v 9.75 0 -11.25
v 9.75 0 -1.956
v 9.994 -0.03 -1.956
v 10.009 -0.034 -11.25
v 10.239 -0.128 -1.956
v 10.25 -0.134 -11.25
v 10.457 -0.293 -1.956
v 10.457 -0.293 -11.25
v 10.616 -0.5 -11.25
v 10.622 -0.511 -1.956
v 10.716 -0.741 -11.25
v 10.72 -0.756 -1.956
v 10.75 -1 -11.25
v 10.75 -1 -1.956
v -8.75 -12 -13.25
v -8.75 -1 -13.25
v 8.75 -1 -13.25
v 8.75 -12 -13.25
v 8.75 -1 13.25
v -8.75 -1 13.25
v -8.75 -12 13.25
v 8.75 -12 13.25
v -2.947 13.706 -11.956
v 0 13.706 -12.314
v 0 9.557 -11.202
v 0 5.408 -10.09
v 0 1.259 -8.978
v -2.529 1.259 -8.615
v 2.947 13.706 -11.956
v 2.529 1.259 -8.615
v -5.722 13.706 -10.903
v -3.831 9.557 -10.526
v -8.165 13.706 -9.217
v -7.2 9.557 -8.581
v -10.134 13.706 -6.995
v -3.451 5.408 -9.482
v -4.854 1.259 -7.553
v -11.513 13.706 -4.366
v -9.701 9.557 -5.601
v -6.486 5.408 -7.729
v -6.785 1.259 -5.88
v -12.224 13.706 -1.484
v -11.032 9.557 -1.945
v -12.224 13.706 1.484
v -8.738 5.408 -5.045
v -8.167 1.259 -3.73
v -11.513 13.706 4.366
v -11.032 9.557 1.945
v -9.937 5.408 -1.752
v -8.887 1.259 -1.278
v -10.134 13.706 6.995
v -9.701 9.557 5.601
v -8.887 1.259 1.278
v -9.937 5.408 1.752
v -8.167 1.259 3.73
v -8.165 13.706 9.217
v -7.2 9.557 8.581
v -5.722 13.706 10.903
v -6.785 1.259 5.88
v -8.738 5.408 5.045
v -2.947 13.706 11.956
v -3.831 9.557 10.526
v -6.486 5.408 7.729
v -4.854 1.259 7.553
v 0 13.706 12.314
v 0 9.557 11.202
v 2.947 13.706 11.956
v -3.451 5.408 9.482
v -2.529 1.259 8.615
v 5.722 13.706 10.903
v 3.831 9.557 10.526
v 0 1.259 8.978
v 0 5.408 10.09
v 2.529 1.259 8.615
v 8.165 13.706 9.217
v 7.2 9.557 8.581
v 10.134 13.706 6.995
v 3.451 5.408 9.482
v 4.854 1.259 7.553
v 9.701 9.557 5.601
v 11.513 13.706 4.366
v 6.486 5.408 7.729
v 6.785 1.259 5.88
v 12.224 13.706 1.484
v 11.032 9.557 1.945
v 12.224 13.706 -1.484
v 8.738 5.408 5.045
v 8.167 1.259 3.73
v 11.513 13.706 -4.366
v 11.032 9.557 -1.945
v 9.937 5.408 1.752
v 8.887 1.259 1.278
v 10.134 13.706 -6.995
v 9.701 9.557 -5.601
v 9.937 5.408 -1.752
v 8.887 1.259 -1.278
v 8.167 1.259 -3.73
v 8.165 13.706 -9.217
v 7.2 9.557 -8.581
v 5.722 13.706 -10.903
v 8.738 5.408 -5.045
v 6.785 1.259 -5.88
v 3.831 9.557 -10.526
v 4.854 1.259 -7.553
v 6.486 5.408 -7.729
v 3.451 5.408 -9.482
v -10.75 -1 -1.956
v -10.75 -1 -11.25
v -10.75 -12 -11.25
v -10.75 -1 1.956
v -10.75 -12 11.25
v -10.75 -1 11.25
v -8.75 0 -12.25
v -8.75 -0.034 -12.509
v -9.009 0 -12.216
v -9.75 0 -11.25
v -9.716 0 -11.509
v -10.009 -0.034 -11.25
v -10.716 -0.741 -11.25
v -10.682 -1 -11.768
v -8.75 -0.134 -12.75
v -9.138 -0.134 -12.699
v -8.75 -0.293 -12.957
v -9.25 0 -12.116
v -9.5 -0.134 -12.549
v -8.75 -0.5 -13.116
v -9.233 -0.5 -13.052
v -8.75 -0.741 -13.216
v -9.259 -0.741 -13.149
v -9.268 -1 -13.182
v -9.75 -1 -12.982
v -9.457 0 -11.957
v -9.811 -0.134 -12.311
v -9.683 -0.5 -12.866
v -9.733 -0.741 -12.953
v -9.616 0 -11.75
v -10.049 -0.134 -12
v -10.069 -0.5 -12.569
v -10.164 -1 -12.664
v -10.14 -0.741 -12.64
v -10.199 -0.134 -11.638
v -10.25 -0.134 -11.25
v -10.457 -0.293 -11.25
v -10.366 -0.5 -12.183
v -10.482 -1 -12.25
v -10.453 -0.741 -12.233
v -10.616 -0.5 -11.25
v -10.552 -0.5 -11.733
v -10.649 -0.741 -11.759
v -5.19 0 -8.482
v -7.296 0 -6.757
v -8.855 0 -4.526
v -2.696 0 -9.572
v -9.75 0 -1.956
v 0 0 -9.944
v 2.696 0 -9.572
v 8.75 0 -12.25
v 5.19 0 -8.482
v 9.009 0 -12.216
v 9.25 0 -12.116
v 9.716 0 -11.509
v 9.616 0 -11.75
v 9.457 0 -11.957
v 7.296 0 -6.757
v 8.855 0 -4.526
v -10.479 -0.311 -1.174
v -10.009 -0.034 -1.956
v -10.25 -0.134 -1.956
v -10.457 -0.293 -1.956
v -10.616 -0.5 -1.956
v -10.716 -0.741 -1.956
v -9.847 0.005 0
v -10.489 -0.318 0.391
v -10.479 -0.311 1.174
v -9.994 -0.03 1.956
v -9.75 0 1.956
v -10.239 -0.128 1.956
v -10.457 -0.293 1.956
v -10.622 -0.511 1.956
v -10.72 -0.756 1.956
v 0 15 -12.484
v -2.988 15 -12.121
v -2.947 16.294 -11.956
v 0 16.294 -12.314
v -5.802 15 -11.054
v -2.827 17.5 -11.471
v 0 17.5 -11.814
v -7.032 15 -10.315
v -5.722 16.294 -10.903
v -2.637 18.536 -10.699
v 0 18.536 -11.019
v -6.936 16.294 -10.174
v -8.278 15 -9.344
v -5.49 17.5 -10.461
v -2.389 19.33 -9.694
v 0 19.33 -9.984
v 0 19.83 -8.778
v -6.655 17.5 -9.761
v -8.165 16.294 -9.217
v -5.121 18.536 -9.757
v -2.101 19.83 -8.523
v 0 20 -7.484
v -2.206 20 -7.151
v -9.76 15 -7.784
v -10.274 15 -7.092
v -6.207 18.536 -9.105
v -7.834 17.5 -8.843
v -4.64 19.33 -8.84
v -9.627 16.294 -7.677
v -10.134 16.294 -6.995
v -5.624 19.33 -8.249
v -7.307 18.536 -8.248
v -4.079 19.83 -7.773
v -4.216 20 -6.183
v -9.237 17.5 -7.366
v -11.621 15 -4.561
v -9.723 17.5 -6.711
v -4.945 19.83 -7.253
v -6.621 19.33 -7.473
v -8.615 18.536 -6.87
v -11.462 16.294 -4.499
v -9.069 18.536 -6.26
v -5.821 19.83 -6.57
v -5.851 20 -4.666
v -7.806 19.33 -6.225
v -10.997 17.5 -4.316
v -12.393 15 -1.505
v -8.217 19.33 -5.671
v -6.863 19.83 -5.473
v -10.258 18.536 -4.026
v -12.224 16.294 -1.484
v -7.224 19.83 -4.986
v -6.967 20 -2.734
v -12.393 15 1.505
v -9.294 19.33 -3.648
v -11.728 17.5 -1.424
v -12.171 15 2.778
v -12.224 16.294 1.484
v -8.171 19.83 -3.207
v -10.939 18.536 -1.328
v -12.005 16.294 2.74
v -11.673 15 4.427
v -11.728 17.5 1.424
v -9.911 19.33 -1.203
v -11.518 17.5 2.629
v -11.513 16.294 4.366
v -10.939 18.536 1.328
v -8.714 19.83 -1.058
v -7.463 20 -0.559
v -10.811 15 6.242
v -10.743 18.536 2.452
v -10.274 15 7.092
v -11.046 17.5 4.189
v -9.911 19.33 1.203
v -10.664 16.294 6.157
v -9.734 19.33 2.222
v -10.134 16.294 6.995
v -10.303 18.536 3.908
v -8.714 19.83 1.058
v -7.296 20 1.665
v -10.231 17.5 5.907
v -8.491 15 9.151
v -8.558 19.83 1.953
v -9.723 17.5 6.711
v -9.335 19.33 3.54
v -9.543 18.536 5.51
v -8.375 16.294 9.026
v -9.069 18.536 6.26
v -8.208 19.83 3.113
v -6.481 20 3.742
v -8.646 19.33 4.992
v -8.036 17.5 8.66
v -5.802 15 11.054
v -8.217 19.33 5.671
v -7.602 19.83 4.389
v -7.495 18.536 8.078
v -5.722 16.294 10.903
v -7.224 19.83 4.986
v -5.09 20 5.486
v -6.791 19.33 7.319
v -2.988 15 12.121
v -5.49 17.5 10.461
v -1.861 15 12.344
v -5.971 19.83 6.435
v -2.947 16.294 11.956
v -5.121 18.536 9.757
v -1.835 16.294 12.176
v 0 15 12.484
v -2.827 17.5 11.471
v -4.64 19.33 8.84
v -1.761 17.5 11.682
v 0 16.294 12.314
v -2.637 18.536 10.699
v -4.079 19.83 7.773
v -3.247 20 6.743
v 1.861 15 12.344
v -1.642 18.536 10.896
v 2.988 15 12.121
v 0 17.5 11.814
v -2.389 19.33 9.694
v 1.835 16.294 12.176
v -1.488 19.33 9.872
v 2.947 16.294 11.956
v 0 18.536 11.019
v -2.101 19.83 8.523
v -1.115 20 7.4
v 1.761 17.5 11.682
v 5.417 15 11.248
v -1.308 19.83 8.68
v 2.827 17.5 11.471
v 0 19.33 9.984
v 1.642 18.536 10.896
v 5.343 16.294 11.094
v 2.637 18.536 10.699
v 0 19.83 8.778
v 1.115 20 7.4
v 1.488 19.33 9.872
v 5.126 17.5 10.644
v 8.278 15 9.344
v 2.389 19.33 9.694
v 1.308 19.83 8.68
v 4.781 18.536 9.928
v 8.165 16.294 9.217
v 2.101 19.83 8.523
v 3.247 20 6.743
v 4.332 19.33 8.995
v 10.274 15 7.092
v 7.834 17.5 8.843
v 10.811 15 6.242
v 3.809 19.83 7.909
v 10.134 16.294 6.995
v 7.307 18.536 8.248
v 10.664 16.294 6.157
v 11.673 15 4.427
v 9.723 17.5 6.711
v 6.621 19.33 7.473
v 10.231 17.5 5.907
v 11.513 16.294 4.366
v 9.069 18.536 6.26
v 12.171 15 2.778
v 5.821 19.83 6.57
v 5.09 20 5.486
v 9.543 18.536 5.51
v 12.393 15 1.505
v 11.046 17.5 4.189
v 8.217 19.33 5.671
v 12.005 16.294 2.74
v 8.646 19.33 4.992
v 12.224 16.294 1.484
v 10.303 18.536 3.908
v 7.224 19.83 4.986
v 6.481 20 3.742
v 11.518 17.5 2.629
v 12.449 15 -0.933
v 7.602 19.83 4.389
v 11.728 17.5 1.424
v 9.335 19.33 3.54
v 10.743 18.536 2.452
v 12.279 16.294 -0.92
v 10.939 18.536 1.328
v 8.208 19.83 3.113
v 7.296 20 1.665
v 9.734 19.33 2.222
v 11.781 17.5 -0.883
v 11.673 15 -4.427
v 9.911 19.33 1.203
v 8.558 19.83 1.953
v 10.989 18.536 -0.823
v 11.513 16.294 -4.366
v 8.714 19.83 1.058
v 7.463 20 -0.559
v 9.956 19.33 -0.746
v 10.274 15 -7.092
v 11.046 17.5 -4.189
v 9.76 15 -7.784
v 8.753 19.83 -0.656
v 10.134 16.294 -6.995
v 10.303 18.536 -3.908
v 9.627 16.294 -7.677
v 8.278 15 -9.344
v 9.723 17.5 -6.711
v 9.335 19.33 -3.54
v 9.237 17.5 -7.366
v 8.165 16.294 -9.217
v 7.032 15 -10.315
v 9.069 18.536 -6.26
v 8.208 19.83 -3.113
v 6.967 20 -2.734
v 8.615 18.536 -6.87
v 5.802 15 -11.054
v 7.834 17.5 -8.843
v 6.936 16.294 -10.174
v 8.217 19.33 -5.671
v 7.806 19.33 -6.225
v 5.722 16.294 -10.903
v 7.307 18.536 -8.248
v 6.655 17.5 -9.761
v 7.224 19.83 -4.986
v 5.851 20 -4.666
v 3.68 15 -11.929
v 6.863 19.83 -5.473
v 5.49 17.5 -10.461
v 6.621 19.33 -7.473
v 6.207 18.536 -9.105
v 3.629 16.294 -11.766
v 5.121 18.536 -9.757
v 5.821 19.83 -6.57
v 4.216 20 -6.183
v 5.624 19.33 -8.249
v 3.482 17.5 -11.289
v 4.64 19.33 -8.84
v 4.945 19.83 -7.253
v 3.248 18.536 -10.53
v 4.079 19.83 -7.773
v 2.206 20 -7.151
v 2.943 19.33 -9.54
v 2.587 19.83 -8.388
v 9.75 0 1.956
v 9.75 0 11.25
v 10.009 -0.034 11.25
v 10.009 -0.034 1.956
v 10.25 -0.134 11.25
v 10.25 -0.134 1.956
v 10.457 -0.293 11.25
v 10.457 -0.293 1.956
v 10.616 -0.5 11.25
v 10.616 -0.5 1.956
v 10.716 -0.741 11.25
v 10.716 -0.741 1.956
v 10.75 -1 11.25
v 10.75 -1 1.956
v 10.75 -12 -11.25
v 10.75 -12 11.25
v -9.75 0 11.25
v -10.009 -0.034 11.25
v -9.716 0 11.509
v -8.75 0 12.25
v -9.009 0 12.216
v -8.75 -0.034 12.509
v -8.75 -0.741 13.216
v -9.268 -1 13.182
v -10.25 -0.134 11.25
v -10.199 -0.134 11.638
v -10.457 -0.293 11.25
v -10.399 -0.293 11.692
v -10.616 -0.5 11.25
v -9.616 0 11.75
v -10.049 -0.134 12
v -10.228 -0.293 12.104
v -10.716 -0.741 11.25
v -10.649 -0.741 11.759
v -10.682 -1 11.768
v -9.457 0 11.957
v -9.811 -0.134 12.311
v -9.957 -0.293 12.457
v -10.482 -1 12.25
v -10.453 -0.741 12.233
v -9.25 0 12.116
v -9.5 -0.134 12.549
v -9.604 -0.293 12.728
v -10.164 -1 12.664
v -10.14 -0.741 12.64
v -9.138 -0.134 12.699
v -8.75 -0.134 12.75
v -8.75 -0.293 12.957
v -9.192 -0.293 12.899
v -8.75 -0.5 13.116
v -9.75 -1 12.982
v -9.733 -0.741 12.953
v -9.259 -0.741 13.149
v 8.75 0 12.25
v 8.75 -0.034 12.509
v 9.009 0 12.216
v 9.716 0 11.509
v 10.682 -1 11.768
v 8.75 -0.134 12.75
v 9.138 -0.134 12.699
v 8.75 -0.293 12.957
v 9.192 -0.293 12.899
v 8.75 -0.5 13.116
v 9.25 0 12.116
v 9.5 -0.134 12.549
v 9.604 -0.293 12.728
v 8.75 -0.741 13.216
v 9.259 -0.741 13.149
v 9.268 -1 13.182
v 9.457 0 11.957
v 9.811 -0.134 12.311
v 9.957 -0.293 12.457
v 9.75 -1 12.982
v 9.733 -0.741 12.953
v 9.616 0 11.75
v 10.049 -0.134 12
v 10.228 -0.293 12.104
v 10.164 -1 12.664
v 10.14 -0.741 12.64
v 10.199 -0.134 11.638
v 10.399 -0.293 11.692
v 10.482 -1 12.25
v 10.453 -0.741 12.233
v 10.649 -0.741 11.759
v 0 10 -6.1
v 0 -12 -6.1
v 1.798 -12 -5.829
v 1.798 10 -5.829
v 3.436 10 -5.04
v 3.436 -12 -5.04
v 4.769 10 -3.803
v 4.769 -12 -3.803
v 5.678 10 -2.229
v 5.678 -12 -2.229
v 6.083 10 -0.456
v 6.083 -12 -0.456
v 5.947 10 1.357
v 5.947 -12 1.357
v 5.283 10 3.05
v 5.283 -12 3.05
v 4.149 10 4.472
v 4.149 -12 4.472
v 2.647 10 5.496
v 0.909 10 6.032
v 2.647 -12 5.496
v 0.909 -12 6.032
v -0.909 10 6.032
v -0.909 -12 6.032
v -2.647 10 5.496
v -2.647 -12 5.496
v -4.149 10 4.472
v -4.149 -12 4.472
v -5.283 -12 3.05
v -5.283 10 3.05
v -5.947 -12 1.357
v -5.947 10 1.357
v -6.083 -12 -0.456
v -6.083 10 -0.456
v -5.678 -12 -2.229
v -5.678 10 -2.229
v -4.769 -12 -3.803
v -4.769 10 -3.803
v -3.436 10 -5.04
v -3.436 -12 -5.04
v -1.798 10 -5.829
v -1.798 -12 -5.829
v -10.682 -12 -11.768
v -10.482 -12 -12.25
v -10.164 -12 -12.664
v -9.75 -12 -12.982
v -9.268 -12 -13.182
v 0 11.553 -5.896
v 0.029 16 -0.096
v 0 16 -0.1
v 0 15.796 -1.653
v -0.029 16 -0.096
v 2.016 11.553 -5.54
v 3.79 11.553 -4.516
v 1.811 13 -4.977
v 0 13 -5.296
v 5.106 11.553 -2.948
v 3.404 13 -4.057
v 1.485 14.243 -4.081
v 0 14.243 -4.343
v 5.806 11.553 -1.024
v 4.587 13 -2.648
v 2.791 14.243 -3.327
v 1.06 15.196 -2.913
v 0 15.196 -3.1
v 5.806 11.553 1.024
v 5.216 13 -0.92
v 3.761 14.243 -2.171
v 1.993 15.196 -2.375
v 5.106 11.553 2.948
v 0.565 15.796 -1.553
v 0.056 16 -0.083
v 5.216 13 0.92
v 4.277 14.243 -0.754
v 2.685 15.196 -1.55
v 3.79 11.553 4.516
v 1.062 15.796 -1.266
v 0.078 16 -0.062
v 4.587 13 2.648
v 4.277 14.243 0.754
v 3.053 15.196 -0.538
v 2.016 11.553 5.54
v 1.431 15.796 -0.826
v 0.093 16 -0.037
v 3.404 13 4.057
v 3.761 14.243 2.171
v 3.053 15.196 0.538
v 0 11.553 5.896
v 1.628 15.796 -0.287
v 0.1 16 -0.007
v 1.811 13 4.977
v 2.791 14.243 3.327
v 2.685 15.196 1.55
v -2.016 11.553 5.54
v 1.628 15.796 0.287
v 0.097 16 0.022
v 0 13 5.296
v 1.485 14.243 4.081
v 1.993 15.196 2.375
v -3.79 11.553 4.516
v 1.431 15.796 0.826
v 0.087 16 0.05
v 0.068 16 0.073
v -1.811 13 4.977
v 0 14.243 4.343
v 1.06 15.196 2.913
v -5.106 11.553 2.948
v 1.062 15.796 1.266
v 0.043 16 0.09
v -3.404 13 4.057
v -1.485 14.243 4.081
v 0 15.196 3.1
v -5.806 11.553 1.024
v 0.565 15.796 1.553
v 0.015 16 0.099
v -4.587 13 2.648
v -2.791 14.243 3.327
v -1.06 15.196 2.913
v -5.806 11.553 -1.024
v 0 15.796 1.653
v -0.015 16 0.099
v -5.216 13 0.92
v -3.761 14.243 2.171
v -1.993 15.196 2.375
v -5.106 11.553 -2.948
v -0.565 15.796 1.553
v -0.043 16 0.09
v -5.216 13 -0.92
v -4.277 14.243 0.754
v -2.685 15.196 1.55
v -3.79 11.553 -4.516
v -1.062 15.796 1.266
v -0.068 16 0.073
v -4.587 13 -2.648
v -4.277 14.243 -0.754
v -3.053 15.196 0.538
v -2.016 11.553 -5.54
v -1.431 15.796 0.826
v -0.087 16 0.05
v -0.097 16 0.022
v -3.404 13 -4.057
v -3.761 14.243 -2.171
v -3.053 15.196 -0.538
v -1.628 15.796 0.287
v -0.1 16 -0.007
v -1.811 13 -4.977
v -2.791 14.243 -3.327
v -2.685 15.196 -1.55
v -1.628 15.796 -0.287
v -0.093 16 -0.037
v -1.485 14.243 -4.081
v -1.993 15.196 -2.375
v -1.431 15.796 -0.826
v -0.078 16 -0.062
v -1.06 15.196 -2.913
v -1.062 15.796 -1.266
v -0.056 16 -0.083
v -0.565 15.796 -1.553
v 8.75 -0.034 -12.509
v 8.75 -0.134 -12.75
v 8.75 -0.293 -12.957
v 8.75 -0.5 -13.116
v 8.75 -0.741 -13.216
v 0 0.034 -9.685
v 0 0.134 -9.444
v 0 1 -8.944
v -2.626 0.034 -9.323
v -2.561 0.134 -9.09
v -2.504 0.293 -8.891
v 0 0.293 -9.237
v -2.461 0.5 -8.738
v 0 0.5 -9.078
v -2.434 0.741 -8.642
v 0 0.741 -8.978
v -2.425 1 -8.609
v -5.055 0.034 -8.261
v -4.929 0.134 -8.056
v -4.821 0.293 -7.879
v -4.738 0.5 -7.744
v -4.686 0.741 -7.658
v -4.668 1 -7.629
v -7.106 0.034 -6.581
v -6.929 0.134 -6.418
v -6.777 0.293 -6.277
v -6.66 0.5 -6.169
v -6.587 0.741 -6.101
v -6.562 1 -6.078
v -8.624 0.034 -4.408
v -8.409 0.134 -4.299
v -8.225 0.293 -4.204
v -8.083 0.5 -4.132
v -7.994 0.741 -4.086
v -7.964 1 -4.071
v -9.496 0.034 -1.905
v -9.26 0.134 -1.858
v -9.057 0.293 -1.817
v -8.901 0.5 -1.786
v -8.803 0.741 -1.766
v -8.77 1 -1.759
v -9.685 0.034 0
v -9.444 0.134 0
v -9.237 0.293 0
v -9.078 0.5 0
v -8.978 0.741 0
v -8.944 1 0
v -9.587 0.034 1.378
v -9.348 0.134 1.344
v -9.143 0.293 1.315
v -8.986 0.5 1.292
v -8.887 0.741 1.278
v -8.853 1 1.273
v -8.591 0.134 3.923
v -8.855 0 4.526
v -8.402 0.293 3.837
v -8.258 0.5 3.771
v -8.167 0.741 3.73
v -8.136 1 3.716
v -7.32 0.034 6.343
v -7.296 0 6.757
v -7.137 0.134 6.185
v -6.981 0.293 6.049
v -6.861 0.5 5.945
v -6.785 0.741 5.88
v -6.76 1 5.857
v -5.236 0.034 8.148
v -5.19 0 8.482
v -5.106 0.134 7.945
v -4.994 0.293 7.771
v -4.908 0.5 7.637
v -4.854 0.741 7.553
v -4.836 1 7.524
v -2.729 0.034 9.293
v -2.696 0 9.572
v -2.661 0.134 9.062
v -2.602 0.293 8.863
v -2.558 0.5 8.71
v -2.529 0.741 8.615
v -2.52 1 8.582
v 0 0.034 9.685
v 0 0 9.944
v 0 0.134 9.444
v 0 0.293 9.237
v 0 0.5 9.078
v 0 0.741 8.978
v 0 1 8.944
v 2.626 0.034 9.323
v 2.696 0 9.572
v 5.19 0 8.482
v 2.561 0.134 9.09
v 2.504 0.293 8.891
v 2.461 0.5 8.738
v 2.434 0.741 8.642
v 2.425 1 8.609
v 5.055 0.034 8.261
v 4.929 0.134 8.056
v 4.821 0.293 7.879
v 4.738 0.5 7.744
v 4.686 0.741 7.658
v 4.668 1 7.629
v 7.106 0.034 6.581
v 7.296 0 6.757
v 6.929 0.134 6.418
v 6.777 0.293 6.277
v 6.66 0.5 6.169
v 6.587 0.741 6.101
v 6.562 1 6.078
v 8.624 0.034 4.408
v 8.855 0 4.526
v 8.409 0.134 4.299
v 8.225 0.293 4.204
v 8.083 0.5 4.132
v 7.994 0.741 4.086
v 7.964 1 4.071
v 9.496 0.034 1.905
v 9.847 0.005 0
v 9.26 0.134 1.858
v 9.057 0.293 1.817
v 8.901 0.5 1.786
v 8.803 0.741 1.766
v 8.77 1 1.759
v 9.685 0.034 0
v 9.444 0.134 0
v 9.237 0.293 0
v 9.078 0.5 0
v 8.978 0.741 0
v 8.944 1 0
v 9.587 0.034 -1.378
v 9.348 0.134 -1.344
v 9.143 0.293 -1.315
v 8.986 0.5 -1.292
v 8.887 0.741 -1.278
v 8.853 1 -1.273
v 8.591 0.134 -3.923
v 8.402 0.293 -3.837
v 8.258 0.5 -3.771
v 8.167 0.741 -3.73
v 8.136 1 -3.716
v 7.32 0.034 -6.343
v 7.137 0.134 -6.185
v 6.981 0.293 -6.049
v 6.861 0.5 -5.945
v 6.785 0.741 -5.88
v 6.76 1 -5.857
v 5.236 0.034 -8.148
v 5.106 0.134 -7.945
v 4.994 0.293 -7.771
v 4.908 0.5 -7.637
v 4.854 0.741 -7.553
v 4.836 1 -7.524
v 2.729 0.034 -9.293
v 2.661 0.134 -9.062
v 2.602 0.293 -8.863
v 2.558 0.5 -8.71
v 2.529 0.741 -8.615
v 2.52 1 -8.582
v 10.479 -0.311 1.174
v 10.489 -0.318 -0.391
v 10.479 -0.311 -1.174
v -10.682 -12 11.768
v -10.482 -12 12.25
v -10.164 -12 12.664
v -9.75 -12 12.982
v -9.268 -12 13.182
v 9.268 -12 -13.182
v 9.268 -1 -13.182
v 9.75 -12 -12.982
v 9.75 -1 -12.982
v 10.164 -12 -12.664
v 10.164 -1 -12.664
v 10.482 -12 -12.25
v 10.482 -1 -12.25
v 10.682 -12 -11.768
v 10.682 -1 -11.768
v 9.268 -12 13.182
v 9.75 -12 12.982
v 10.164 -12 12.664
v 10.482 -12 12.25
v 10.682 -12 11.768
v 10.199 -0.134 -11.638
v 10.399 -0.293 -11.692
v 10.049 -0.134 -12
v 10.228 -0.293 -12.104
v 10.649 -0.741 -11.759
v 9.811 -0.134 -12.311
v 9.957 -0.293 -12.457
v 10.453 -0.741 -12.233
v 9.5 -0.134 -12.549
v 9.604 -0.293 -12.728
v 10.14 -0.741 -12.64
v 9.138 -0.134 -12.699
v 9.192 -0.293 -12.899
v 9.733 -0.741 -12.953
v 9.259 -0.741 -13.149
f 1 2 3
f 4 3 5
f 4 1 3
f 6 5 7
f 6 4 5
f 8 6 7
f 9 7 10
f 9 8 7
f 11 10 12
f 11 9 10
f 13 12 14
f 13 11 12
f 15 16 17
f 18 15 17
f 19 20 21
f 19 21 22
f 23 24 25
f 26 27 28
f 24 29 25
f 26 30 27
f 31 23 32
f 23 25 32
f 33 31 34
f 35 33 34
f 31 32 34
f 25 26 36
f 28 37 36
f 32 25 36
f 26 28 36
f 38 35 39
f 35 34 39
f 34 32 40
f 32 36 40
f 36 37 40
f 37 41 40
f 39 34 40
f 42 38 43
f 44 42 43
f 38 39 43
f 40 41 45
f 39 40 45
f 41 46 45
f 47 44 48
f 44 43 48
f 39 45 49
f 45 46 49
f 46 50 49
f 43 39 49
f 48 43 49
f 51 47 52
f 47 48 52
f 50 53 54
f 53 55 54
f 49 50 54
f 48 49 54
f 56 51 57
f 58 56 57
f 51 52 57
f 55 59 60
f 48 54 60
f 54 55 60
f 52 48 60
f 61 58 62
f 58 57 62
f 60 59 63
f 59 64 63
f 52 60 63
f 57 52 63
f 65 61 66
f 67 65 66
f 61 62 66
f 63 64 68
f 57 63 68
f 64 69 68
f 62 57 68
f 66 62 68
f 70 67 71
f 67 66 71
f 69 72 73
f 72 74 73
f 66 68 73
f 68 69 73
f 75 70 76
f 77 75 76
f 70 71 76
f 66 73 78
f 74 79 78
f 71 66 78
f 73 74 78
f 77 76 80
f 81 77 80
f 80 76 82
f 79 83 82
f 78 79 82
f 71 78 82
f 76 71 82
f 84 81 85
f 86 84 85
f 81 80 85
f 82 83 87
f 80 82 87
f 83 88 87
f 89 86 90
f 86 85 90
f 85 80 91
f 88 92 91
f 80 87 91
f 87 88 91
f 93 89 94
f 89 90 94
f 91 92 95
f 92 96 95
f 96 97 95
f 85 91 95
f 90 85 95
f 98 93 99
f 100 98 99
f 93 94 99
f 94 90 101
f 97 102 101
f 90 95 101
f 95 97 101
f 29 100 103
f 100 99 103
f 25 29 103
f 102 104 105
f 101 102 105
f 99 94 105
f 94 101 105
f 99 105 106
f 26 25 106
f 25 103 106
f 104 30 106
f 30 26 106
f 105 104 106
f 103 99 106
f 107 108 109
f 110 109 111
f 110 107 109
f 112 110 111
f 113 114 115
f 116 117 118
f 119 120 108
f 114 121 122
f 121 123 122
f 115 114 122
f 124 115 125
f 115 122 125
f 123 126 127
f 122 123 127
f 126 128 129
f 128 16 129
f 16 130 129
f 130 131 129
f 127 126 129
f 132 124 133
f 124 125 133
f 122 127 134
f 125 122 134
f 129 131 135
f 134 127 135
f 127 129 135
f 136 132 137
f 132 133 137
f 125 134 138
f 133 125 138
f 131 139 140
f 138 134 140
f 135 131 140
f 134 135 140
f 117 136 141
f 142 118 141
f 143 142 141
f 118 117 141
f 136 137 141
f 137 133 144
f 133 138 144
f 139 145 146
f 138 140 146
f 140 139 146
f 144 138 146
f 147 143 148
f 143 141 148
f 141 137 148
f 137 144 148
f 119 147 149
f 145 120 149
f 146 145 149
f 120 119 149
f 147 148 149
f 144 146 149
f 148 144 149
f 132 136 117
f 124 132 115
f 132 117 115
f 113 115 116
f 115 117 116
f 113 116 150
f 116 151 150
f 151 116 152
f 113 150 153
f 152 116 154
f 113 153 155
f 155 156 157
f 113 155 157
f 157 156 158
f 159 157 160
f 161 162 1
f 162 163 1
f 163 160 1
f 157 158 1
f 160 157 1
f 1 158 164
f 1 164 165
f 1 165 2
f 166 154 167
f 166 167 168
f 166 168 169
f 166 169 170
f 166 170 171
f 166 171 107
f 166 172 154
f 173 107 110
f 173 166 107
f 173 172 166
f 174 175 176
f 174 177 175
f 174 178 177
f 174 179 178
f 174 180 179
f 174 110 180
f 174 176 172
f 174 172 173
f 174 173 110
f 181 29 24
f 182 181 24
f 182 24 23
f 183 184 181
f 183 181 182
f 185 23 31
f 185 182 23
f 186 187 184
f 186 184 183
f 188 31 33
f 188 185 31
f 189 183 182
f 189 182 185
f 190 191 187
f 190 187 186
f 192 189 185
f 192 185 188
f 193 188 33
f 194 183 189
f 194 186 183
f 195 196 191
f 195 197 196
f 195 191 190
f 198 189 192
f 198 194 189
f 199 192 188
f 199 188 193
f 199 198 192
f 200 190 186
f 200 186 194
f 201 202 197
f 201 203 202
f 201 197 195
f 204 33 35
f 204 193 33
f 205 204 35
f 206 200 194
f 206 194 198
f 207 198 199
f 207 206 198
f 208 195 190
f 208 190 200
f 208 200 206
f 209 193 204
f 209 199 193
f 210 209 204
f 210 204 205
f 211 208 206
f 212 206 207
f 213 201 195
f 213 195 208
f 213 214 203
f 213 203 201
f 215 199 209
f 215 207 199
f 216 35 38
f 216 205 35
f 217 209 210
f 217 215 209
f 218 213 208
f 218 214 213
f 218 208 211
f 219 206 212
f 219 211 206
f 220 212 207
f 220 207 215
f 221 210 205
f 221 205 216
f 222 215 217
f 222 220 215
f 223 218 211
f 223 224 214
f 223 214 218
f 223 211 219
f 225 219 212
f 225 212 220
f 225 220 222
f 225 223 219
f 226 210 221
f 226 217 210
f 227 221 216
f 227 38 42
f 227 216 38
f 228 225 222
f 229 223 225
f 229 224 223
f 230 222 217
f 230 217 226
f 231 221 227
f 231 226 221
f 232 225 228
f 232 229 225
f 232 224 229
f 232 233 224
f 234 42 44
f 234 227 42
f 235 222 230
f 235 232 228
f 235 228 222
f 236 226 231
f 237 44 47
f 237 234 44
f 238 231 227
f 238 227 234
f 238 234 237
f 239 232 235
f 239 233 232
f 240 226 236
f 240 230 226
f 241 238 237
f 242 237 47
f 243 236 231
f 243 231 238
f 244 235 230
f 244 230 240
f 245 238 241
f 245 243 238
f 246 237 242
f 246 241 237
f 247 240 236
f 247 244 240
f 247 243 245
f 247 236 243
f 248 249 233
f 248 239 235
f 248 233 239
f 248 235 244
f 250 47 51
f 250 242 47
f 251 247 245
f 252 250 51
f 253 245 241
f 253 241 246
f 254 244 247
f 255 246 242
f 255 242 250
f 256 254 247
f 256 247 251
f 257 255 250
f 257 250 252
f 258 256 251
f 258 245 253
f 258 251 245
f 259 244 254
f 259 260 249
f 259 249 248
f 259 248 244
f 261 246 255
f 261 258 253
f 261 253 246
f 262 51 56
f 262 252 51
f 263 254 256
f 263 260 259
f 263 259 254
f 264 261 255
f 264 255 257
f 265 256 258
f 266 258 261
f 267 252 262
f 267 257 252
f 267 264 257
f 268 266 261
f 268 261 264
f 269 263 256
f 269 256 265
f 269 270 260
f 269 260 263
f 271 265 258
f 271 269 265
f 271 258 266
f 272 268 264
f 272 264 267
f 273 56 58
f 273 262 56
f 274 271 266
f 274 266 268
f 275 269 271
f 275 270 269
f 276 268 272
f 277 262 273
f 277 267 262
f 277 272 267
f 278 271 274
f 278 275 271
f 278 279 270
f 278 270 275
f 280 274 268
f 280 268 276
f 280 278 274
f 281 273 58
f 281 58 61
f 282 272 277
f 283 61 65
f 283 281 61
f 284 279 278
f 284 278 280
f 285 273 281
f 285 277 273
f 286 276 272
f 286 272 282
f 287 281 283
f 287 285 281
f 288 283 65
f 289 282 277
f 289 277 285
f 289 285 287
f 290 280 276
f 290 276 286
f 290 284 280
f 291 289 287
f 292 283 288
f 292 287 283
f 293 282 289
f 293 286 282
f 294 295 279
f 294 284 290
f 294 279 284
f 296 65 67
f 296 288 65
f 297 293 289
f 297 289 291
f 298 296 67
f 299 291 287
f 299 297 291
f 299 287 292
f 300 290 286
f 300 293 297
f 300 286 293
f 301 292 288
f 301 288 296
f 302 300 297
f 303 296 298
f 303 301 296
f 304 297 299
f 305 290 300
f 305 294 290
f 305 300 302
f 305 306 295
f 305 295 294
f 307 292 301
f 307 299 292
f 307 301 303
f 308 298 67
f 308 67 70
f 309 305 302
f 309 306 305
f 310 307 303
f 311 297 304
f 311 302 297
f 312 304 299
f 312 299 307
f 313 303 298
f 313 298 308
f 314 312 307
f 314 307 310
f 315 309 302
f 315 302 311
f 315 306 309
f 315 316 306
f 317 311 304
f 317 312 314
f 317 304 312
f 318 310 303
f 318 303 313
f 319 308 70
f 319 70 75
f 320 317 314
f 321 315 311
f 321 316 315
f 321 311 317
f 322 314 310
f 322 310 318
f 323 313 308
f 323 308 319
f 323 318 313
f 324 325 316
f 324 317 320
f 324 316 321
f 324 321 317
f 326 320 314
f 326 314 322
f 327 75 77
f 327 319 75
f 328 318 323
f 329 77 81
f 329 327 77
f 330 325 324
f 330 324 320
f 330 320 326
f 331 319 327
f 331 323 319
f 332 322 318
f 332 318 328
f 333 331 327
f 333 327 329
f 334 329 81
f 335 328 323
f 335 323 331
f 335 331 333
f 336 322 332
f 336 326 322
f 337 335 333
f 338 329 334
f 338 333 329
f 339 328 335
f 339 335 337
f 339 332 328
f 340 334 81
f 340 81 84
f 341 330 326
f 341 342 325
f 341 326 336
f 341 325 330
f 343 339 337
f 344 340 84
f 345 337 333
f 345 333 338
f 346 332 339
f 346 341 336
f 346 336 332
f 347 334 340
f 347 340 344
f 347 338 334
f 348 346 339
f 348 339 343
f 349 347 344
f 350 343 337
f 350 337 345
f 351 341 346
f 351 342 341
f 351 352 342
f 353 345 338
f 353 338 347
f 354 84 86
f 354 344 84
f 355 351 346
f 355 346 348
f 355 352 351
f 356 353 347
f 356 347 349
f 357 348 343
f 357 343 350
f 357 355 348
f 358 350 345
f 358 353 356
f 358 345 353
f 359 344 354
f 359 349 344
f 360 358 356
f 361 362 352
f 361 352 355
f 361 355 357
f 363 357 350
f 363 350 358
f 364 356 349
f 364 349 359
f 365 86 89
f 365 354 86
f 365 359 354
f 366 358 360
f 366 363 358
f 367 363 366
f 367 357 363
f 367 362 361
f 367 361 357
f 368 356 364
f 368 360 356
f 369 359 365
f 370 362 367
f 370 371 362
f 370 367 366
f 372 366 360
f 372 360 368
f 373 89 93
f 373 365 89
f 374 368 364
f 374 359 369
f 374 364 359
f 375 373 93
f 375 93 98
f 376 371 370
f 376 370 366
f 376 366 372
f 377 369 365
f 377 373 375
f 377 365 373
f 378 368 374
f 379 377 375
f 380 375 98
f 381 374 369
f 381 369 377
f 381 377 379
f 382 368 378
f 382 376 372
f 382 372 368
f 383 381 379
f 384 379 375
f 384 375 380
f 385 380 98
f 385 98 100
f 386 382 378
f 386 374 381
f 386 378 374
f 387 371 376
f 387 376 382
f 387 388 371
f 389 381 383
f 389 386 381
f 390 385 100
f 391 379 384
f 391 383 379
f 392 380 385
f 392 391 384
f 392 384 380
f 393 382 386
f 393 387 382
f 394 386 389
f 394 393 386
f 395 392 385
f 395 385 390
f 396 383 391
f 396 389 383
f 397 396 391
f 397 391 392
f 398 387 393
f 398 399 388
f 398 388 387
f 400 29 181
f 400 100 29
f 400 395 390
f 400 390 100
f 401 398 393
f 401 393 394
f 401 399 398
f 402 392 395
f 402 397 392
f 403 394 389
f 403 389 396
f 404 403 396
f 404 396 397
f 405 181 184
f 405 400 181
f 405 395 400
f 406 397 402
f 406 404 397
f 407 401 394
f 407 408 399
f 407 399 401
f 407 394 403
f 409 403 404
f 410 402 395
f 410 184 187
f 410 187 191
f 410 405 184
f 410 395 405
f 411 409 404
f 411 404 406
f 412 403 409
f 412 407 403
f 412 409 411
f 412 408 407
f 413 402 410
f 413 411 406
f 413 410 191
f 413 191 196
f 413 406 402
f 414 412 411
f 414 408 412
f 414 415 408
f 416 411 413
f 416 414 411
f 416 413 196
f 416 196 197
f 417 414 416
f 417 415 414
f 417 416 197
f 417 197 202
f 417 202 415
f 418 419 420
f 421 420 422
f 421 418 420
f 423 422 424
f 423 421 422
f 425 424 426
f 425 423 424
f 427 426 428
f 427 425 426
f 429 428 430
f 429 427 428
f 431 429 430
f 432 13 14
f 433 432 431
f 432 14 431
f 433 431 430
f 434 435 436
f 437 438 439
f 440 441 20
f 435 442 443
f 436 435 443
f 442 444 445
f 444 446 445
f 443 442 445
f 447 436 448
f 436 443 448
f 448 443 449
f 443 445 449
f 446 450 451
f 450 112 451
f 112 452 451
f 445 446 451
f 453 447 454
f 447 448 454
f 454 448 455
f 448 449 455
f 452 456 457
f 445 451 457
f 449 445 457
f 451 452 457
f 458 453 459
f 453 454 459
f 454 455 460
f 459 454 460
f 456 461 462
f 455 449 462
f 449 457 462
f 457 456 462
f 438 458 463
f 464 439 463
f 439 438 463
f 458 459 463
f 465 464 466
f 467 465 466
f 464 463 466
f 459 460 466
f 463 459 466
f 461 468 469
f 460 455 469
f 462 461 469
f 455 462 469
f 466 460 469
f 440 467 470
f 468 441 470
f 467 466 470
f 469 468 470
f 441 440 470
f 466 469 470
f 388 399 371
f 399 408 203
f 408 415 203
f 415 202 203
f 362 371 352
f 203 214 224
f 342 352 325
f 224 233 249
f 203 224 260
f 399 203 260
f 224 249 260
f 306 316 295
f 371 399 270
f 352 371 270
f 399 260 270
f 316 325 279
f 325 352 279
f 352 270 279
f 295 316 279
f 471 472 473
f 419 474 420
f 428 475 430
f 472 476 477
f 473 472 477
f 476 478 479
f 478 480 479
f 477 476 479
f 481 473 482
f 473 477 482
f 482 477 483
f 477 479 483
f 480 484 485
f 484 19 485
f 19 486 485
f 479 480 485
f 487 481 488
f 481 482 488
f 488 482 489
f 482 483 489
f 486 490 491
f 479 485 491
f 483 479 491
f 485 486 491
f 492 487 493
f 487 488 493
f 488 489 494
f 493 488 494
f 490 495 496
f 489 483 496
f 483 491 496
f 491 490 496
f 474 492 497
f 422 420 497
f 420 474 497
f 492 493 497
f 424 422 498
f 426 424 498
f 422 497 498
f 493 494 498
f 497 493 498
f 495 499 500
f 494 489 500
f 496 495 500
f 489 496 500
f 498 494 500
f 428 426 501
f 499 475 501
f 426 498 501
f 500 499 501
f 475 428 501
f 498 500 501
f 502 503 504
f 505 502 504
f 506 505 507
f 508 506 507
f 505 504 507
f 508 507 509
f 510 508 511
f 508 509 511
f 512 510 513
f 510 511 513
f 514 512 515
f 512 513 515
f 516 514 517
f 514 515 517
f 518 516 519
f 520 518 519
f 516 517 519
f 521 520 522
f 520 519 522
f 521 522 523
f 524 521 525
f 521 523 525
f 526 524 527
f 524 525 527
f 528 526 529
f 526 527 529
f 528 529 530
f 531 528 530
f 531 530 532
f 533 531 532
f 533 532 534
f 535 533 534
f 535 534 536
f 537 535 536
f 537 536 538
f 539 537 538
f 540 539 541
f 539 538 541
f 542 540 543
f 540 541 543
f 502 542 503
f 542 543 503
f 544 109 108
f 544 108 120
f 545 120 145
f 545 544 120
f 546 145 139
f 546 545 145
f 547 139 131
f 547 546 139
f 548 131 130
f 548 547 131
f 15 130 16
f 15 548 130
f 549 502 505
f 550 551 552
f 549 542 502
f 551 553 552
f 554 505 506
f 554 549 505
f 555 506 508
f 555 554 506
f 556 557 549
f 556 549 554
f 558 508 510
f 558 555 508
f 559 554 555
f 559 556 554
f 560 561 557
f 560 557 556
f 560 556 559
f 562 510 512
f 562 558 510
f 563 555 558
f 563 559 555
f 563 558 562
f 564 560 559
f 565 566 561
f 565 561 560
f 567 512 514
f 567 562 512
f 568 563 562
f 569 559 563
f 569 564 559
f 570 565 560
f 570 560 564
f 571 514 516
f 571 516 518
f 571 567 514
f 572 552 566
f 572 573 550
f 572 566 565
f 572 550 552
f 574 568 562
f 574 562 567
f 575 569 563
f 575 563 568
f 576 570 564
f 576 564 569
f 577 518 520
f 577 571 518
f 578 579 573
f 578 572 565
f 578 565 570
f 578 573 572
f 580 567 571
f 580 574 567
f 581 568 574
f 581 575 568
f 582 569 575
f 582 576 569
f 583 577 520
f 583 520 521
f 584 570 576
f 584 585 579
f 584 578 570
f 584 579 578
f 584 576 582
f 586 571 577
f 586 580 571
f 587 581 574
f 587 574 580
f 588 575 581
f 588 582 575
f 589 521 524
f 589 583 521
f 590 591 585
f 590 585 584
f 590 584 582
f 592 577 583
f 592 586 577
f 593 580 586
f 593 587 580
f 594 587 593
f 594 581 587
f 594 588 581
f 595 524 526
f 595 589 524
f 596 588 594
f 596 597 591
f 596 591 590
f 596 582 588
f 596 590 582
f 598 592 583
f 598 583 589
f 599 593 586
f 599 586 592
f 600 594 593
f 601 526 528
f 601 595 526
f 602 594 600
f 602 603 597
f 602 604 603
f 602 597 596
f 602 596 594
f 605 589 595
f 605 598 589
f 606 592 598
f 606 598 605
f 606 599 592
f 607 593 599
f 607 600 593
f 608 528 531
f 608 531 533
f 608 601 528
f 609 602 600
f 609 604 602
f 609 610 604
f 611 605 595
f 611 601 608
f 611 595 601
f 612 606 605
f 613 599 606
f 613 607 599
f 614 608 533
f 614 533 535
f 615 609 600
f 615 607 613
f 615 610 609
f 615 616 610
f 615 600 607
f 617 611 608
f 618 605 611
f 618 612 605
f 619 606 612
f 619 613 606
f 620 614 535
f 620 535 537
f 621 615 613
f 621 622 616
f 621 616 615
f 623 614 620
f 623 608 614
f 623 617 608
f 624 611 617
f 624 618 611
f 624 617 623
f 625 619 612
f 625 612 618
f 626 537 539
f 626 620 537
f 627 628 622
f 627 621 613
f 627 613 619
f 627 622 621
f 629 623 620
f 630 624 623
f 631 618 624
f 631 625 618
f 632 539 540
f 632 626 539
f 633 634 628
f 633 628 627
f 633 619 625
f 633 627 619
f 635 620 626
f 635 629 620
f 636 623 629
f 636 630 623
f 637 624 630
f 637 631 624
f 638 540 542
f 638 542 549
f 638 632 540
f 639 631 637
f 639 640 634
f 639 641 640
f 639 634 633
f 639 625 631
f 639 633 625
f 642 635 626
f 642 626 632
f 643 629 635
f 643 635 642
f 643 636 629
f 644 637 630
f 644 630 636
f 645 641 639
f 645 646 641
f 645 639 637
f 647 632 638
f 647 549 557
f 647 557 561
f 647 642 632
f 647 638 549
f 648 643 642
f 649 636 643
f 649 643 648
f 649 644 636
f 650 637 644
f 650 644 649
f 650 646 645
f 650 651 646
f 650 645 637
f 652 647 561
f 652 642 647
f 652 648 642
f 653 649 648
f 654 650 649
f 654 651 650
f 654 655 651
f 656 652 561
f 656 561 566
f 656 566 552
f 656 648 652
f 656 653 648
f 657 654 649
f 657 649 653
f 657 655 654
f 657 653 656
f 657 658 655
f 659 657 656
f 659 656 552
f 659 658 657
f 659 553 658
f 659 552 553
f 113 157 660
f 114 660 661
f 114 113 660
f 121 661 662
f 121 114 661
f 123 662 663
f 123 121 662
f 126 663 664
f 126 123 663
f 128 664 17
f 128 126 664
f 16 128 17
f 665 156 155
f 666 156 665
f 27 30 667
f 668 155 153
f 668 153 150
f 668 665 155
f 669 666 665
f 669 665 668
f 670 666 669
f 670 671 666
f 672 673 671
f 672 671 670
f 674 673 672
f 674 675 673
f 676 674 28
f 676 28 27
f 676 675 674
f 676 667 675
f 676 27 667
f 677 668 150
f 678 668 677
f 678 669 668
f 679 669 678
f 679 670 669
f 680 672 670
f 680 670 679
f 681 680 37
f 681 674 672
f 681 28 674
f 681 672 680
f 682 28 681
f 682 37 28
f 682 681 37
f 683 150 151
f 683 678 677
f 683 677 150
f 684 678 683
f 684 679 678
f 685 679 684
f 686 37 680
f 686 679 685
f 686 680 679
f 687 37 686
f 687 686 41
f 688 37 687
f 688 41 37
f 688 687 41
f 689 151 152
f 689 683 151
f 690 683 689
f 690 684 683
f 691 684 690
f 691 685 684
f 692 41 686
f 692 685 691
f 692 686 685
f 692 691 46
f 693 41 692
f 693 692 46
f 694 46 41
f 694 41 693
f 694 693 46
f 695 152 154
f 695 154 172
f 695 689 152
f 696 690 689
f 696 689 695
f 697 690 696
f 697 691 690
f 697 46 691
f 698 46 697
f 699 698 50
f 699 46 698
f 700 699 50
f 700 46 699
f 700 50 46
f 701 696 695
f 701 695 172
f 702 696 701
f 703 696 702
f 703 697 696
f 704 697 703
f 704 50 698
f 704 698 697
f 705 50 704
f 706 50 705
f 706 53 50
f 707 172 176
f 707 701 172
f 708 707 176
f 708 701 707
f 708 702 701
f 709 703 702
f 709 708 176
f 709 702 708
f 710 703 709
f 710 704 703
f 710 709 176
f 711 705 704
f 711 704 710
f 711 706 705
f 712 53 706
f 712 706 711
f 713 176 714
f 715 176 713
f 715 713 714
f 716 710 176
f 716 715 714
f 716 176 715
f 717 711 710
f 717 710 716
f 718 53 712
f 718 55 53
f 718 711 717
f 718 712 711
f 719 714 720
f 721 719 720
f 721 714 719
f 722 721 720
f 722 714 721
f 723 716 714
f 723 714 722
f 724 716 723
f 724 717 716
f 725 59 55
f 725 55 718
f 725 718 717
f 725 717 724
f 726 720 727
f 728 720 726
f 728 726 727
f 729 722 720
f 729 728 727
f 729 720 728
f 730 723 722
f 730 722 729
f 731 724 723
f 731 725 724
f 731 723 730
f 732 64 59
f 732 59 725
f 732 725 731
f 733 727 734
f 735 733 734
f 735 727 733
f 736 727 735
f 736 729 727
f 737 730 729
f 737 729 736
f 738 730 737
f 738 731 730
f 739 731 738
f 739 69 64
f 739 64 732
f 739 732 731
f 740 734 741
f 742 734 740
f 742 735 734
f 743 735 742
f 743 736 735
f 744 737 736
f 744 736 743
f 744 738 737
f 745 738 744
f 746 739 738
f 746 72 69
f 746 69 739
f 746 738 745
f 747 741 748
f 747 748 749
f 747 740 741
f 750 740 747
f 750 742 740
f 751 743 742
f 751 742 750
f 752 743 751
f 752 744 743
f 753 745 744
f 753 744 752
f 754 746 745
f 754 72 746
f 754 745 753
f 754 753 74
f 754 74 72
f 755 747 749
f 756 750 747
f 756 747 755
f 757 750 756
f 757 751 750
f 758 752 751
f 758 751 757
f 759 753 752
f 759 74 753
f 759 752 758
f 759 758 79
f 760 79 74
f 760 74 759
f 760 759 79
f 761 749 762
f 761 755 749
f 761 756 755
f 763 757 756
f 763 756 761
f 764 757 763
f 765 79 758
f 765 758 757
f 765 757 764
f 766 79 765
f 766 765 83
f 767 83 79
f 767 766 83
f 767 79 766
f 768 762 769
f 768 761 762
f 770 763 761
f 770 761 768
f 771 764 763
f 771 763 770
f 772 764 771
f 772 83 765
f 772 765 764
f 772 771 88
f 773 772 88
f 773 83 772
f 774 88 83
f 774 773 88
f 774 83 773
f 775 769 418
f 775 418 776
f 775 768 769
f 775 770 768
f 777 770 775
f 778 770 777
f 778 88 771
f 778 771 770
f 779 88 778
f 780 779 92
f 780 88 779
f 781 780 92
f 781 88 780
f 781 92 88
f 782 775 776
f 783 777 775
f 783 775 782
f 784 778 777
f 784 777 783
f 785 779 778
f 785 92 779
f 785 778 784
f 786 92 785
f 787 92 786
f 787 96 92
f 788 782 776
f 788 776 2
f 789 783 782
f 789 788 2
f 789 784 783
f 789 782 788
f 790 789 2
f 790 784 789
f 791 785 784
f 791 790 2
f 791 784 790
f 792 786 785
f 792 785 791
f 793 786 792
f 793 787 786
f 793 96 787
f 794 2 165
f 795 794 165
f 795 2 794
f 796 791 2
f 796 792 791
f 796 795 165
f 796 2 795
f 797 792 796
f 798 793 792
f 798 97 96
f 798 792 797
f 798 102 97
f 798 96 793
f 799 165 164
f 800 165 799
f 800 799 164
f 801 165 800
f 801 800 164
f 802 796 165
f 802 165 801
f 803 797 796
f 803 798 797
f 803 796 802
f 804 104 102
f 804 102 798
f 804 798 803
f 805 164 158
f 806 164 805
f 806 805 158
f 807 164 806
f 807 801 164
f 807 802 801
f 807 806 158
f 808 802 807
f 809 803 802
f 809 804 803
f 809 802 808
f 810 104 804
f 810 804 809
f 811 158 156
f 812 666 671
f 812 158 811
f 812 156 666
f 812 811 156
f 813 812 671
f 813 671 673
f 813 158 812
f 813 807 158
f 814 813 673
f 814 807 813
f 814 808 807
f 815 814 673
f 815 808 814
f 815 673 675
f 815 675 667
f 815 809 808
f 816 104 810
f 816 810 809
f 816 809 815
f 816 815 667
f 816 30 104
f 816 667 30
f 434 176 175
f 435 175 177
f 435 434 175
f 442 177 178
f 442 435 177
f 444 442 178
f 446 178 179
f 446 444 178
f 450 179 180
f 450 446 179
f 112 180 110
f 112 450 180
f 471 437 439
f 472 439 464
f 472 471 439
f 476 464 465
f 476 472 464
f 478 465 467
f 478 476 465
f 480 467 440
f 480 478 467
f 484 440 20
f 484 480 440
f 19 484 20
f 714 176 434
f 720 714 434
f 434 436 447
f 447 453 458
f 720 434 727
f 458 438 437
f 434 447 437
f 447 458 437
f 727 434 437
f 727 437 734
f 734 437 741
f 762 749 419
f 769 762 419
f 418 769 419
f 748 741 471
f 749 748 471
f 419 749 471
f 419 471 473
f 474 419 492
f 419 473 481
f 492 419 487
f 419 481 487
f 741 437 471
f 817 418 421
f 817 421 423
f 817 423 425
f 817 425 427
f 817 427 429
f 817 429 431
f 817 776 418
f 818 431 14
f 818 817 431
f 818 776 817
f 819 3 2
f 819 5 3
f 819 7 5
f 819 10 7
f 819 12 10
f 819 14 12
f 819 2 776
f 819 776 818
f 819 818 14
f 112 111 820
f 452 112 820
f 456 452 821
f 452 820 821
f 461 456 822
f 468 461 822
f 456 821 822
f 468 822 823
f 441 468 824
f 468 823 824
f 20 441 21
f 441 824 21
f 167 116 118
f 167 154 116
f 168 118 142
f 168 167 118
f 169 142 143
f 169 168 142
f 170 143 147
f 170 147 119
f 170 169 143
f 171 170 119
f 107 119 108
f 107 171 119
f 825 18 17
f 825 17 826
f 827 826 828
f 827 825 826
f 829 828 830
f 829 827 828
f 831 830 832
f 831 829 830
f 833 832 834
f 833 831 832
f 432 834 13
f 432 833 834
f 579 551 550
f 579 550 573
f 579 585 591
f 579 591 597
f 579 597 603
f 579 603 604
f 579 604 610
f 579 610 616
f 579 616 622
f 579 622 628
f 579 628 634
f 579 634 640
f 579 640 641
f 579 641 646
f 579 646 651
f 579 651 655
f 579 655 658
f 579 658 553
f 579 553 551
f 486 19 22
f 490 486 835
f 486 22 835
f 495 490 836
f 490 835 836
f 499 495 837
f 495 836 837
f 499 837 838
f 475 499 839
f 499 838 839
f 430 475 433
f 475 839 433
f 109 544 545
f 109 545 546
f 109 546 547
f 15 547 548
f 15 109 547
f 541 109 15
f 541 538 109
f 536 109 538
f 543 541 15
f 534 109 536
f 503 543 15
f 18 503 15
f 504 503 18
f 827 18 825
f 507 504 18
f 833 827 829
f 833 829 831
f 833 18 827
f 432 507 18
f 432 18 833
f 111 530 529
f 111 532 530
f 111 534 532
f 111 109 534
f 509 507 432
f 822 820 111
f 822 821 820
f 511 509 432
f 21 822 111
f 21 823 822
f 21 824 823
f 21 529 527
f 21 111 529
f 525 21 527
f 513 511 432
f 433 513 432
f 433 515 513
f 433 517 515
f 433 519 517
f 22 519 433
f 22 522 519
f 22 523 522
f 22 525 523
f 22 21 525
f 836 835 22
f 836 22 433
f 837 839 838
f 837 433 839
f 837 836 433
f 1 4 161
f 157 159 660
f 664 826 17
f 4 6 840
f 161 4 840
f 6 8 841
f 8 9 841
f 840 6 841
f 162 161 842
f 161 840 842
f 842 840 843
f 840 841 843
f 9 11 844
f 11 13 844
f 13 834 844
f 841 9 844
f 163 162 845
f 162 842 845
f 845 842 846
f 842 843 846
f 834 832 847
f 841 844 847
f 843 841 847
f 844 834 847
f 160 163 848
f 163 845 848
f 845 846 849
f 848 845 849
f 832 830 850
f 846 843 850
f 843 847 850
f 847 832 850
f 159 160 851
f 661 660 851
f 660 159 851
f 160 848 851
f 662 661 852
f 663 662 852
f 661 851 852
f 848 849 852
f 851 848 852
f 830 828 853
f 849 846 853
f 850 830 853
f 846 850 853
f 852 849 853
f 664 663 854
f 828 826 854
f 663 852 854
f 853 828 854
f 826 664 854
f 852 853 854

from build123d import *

# Parameters (mm, degrees)
ESQUISSE3_W             = 21.5
ESQUISSE3_H             = 26.5
BOSS_EXTRU_2_DEPTH      = 12
CONG_1_R                = 5
CONG_2_R                = 2
CONG_3_R                = 1
CONG_4_R                = 1
ESQUISSE4_R             = 6.1
ENL_V_MAT_EXTRU_1_DEPTH = 28
CONG_5_R                = 6


with BuildPart() as part:
    # Esquisse2 → Révolution1 (revolve)
    with BuildSketch(Plane.XY, mode=Mode.PRIVATE) as r_volution1_sk:
        Polygon((0, 20), (14, 20), (8.641016151, 0), (0, 0), align=None)
    revolve(r_volution1_sk.sketch.rotate(Axis((0, 0, 0), (0, 1, 0)), 90), axis=Axis((0, 0, 0), (0, 1, 0)))

    # Esquisse3 → Boss.-Extru.2 (add)
    with BuildSketch(Plane.XZ):
        Rectangle(ESQUISSE3_W, ESQUISSE3_H)
    extrude(amount=BOSS_EXTRU_2_DEPTH)

    # Congé1
    cong_1_edges = [part.edges().sort_by_distance(p)[0] for p in [
        (0, 20, 14),
    ]]
    fillet(cong_1_edges, radius=CONG_1_R)

    # Congé2
    cong_2_edges = [part.edges().sort_by_distance(p)[0] for p in [
        (10.75, -6, 13.25),
        (-10.75, -6, 13.25),
        (-10.75, -6, -13.25),
        (10.75, -6, -13.25),
    ]]
    fillet(cong_2_edges, radius=CONG_2_R)

    # Congé3
    cong_3_edges = [part.edges().sort_by_distance(p)[0] for p in [
        (0, 0, 8.641016151),
    ]]
    fillet(cong_3_edges, radius=CONG_3_R)

    # Congé4
    cong_4_edges = [part.edges().sort_by_distance(p)[0] for p in [
        (-10.75, 0, 0),
        (10.75, 0, 0),
        (0, 0, -13.25),
        (0, 0, 13.25),
        (10.164213562, 0, -12.664213562),
        (-10.164213562, 0, -12.664213562),
        (10.164213562, 0, 12.664213562),
        (-10.164213562, 0, 12.664213562),
    ]]
    fillet(cong_4_edges, radius=CONG_4_R)

    # Esquisse4 → Enlèv. mat.-Extru.1 (cut)
    with BuildSketch(Plane.XZ.offset(12)):
        with Locations(Location((0, 0, 0), (0, 0, 270))):
            Circle(ESQUISSE4_R)
    extrude(amount=-ENL_V_MAT_EXTRU_1_DEPTH, mode=Mode.SUBTRACT)

    # Congé5
    cong_5_edges = [part.edges().sort_by_distance(p)[0] for p in [
        (0, 16, 6.1),
    ]]
    fillet(cong_5_edges, radius=CONG_5_R)


solid = part.part
